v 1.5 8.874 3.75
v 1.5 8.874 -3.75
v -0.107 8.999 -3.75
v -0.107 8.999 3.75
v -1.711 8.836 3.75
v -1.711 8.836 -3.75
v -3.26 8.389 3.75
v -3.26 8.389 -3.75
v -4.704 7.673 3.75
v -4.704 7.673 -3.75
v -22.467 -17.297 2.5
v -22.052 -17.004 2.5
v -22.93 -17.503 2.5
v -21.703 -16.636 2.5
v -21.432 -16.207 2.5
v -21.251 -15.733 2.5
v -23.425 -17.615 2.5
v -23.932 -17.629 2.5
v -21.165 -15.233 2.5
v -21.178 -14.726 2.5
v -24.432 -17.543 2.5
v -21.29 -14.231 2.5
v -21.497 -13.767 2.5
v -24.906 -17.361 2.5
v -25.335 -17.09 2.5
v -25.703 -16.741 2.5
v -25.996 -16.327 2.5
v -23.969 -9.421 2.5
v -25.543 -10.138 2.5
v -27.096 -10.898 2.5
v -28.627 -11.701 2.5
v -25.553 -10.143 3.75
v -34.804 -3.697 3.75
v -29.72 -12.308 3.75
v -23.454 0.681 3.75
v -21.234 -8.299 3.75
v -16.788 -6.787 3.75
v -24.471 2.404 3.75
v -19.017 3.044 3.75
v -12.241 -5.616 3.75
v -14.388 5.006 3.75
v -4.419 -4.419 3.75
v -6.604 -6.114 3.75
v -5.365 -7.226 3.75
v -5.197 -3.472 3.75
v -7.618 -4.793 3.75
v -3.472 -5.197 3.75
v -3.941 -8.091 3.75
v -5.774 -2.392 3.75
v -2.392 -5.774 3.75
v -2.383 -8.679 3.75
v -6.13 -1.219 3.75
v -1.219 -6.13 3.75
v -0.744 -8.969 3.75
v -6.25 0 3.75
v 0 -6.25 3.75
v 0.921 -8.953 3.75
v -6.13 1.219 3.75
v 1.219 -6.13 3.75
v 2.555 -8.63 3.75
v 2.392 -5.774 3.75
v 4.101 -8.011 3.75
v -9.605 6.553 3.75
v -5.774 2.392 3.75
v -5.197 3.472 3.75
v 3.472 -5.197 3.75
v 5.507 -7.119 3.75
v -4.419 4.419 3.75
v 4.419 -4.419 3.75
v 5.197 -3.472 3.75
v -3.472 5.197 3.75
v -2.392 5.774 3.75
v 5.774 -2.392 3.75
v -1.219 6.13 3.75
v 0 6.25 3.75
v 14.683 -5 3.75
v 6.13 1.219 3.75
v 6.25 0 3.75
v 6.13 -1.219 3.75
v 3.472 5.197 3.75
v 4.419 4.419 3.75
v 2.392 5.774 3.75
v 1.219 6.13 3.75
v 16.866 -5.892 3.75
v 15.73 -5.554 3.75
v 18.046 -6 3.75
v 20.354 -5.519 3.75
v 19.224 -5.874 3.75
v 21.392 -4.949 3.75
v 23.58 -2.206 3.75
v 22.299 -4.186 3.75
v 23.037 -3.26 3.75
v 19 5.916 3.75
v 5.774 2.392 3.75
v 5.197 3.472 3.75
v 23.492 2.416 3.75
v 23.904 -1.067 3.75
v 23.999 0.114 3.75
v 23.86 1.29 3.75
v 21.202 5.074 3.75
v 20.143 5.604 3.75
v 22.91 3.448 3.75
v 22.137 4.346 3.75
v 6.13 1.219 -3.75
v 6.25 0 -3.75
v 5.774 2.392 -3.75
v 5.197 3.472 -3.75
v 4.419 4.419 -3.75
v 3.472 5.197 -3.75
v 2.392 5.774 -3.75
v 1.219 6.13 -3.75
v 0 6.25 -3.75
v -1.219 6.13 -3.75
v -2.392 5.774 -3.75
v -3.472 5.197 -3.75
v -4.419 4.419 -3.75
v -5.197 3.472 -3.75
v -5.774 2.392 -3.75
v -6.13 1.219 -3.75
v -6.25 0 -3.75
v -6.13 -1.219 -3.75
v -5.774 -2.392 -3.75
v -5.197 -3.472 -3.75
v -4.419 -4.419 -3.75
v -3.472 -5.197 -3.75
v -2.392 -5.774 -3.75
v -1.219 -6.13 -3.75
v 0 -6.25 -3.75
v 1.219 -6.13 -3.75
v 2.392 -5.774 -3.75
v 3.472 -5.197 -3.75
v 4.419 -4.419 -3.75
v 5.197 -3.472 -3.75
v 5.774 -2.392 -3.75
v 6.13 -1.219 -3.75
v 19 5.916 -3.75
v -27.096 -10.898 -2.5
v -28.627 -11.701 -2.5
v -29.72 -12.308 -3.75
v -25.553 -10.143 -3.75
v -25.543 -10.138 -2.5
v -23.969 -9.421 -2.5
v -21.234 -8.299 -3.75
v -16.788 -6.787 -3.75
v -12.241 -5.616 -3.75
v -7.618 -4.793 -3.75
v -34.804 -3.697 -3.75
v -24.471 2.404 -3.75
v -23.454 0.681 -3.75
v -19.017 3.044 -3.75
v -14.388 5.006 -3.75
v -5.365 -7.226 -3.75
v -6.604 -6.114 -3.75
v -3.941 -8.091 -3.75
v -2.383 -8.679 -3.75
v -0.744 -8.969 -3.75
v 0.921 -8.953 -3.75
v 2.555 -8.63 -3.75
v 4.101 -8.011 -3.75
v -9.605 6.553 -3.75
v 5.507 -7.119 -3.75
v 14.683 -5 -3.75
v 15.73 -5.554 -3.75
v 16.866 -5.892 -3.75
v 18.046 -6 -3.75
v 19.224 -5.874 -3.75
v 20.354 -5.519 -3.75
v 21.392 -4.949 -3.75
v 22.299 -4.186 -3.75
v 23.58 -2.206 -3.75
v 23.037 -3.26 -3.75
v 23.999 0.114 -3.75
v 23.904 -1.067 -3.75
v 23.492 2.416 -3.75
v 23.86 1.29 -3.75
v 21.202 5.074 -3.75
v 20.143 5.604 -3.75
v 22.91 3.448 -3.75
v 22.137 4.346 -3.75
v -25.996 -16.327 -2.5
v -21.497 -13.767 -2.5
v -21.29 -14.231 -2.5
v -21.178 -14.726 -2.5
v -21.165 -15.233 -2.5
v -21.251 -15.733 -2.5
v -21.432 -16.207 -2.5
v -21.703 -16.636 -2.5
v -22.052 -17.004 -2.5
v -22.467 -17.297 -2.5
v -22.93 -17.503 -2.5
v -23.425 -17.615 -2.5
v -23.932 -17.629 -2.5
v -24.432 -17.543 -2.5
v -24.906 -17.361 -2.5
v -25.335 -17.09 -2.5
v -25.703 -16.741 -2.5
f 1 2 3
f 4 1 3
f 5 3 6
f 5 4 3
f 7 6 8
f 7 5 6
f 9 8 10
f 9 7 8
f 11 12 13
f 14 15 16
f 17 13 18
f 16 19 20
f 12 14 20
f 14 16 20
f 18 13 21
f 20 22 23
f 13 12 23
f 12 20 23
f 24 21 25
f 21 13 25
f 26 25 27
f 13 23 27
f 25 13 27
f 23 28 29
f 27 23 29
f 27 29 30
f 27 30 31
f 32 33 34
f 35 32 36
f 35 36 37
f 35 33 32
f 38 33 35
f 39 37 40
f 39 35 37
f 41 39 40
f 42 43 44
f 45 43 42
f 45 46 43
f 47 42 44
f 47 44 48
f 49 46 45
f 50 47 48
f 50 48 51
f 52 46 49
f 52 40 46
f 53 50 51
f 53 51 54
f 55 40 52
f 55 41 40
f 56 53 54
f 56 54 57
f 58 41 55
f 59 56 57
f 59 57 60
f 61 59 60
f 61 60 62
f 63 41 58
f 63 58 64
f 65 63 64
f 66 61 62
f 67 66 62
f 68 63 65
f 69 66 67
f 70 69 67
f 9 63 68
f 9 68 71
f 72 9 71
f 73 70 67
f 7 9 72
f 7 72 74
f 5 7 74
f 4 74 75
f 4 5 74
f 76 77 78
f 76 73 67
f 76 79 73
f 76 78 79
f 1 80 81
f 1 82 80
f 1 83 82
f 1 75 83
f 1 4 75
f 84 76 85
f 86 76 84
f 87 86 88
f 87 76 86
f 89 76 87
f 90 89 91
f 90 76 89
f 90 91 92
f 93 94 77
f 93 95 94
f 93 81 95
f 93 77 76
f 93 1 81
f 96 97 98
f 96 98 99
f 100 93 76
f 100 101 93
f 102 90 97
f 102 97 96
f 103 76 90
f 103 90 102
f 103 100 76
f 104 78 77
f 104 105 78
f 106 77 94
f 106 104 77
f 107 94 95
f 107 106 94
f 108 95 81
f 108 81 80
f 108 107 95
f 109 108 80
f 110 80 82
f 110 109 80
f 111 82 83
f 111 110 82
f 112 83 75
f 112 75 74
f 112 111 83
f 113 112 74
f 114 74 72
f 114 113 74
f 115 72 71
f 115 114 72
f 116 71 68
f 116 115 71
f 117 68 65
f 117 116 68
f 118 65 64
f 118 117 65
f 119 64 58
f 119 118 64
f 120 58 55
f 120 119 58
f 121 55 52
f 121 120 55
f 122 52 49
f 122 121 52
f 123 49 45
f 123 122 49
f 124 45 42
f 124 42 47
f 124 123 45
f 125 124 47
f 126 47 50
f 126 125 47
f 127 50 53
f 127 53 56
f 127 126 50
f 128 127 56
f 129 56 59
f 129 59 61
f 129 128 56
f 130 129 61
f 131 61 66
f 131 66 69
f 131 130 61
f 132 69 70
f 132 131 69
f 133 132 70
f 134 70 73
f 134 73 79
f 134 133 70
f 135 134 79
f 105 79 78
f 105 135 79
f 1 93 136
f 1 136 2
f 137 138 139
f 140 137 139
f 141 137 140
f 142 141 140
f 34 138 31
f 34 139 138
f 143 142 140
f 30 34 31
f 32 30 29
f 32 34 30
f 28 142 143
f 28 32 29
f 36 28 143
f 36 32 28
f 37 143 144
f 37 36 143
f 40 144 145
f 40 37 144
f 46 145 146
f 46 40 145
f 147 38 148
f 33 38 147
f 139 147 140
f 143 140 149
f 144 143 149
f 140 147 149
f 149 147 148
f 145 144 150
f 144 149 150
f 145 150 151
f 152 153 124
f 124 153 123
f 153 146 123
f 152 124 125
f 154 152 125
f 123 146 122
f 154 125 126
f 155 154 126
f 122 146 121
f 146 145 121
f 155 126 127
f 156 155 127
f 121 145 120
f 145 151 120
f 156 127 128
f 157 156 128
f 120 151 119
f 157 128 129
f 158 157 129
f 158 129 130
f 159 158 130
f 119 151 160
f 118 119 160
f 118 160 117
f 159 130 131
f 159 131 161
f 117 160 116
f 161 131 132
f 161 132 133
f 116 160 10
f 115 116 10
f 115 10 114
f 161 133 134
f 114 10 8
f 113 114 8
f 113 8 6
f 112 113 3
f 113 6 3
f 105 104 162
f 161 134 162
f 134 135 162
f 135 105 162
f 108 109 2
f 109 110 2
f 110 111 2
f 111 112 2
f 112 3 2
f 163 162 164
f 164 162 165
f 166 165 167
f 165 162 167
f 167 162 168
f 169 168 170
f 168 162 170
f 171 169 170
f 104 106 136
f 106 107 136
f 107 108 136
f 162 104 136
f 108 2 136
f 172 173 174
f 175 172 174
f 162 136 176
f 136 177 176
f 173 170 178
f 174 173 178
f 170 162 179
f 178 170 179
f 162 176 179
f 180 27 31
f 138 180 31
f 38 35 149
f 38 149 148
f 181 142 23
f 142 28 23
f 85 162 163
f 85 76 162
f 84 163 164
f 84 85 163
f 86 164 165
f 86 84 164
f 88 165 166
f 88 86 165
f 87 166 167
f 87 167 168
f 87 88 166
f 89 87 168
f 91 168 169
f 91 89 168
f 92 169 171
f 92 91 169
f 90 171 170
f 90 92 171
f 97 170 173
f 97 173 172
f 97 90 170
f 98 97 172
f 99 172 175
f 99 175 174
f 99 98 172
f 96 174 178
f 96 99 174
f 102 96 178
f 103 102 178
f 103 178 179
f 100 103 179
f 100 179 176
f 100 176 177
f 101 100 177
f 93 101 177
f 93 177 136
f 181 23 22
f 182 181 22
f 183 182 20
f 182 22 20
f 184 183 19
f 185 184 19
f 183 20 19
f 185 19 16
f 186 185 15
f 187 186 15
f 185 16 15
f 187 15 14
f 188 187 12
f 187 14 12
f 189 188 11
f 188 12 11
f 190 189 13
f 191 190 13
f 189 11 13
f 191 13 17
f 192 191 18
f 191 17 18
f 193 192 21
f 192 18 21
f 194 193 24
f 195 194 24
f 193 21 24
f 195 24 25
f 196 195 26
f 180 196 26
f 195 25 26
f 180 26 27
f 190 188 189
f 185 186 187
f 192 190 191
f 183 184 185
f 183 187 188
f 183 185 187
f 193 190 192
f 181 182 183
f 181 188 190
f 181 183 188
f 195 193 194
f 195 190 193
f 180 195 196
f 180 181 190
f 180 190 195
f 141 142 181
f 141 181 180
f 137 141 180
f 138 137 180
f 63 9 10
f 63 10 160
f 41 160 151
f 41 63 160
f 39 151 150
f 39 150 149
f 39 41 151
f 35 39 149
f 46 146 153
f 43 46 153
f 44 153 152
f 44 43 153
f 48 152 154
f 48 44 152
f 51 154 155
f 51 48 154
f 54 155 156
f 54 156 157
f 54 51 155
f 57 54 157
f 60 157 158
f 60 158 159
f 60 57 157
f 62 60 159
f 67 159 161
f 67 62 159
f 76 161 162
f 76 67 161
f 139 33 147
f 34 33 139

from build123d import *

# Parameters (mm, degrees)
SKETCH1_R           = 6.25
BOSS_EXTRUDE1_DEPTH = 3.75
BOSS_EXTRUDE2_DEPTH = 2.5


with BuildPart() as part:
    # Sketch1 → Boss-Extrude1 (new body, symmetric)
    with BuildSketch(Plane.XY):
        with BuildLine():
            ThreePointArc((14.68337521, -5), (23.5795956, -2.206380053), (19, 5.916079783))
            Line((19, 5.916079783), (1.5, 8.874119675))
            ThreePointArc((1.5, 8.874119675), (-1.711171484, 8.835830021), (-4.704473056, 7.672544119))
            ThreePointArc((-4.704473056, 7.672544119), (-14.388421791, 5.006214545), (-23.453994607, 0.681452586))
            Line((-23.453994607, 0.681452586), (-24.470827362, 2.403675322))
            Line((-24.470827362, 2.403675322), (-34.804163773, -3.697321205))
            Line((-34.804163773, -3.697321205), (-29.72, -12.308434881))
            ThreePointArc((-29.72, -12.308434881), (-19.025686771, -7.501050673), (-7.617535769, -4.793031276))
            ThreePointArc((-7.617535769, -4.793031276), (-1.570247279, -8.861959348), (5.50692712, -7.118549971))
            Line((5.50692712, -7.118549971), (14.68337521, -5))
        make_face()
        Circle(SKETCH1_R, mode=Mode.SUBTRACT)
    extrude(amount=BOSS_EXTRUDE1_DEPTH, both=True)

    # Sketch2 → Boss-Extrude2 (add, symmetric)
    with BuildSketch(Plane.XY):
        with BuildLine():
            Line((-28.63346637, -11.690418156), (-24.131806399, -9.129888895))
            Line((-24.131806399, -9.129888895), (-23.968684666, -9.421327611))
            Line((-23.968684666, -9.421327611), (-21.496617767, -13.767462129))
            ThreePointArc((-21.496617767, -13.767462129), (-22.466751825, -17.296987603), (-25.996277299, -16.326853546))
            Line((-25.996277299, -16.326853546), (-28.63346637, -11.690418156))
        make_face()
    extrude(amount=BOSS_EXTRUDE2_DEPTH, both=True)


solid = part.part
